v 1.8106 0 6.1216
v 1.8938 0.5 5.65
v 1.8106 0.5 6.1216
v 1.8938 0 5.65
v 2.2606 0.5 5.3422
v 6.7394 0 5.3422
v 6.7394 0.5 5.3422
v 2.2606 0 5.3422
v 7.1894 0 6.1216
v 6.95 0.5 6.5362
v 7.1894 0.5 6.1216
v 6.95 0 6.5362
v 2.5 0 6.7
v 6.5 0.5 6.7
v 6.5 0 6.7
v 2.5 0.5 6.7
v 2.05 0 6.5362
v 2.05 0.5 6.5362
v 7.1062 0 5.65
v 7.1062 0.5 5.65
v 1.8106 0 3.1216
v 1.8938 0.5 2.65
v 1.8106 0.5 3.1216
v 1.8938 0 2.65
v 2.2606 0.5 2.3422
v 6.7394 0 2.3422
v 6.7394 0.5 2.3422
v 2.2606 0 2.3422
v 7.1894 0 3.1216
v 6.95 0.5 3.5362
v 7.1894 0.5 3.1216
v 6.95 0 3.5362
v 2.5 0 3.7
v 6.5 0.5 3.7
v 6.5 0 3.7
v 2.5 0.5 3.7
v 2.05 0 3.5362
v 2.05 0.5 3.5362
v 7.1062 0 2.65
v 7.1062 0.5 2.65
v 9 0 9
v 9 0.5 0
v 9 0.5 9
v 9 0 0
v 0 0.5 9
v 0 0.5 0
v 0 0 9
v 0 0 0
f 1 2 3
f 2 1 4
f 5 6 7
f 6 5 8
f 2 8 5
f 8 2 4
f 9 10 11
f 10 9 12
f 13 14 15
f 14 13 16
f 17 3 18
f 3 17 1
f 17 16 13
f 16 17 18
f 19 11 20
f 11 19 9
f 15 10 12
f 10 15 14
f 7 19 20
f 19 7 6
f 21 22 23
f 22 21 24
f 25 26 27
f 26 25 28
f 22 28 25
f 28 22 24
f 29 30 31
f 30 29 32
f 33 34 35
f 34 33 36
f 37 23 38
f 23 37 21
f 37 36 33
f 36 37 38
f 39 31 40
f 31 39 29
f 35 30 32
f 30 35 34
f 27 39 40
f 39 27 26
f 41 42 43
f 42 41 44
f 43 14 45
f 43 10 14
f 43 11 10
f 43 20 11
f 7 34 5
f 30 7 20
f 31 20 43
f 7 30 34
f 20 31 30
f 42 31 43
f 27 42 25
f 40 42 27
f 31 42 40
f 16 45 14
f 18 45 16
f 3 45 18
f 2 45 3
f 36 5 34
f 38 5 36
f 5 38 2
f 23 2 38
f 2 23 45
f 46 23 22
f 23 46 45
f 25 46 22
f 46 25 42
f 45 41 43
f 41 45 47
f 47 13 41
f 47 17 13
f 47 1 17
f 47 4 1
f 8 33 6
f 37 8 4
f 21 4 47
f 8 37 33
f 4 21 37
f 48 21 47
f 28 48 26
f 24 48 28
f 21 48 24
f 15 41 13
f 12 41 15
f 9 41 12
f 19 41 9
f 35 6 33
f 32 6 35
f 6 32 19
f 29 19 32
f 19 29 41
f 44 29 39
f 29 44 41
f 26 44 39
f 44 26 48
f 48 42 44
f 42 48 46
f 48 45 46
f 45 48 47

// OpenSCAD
$fs = 0.5;

base_terminal_size = [10, 1, 10];

module cutout_base(thickness) {
  translate([0, 0, -0.01]) {
    linear_extrude(thickness + 0.02) {
      hull() {
        translate([0, -2, 0]) circle(0.7);
        translate([0, 2, 0]) circle(0.7);
      }
    }
  }
}

module cutout(dimensions) {
  rotate([-90, -90, 0]) {
    translate(v=[dimensions.z / 2 + dimensions.z / 6, dimensions.x / 2, 0])
      cutout_base(dimensions.y);
    translate(v=[dimensions.z / 2 - dimensions.z / 6, dimensions.x / 2, 0])
      cutout_base(dimensions.y);
  }
}

module terminal(dimensions = [9, 0.5, 9]) {
  difference() {
    scale(
      [
        dimensions.x / base_terminal_size.x,
        dimensions.y / base_terminal_size.y,
        dimensions.z / base_terminal_size.z,
      ]
    )
      translate([0, base_terminal_size.y, base_terminal_size.x]) {
        rotate([90, 90, 0]) {
          linear_extrude(base_terminal_size.y) {
            square([base_terminal_size.x, base_terminal_size.z]);
          }
        }
      }
    cutout(dimensions);
  }
}

terminal();
